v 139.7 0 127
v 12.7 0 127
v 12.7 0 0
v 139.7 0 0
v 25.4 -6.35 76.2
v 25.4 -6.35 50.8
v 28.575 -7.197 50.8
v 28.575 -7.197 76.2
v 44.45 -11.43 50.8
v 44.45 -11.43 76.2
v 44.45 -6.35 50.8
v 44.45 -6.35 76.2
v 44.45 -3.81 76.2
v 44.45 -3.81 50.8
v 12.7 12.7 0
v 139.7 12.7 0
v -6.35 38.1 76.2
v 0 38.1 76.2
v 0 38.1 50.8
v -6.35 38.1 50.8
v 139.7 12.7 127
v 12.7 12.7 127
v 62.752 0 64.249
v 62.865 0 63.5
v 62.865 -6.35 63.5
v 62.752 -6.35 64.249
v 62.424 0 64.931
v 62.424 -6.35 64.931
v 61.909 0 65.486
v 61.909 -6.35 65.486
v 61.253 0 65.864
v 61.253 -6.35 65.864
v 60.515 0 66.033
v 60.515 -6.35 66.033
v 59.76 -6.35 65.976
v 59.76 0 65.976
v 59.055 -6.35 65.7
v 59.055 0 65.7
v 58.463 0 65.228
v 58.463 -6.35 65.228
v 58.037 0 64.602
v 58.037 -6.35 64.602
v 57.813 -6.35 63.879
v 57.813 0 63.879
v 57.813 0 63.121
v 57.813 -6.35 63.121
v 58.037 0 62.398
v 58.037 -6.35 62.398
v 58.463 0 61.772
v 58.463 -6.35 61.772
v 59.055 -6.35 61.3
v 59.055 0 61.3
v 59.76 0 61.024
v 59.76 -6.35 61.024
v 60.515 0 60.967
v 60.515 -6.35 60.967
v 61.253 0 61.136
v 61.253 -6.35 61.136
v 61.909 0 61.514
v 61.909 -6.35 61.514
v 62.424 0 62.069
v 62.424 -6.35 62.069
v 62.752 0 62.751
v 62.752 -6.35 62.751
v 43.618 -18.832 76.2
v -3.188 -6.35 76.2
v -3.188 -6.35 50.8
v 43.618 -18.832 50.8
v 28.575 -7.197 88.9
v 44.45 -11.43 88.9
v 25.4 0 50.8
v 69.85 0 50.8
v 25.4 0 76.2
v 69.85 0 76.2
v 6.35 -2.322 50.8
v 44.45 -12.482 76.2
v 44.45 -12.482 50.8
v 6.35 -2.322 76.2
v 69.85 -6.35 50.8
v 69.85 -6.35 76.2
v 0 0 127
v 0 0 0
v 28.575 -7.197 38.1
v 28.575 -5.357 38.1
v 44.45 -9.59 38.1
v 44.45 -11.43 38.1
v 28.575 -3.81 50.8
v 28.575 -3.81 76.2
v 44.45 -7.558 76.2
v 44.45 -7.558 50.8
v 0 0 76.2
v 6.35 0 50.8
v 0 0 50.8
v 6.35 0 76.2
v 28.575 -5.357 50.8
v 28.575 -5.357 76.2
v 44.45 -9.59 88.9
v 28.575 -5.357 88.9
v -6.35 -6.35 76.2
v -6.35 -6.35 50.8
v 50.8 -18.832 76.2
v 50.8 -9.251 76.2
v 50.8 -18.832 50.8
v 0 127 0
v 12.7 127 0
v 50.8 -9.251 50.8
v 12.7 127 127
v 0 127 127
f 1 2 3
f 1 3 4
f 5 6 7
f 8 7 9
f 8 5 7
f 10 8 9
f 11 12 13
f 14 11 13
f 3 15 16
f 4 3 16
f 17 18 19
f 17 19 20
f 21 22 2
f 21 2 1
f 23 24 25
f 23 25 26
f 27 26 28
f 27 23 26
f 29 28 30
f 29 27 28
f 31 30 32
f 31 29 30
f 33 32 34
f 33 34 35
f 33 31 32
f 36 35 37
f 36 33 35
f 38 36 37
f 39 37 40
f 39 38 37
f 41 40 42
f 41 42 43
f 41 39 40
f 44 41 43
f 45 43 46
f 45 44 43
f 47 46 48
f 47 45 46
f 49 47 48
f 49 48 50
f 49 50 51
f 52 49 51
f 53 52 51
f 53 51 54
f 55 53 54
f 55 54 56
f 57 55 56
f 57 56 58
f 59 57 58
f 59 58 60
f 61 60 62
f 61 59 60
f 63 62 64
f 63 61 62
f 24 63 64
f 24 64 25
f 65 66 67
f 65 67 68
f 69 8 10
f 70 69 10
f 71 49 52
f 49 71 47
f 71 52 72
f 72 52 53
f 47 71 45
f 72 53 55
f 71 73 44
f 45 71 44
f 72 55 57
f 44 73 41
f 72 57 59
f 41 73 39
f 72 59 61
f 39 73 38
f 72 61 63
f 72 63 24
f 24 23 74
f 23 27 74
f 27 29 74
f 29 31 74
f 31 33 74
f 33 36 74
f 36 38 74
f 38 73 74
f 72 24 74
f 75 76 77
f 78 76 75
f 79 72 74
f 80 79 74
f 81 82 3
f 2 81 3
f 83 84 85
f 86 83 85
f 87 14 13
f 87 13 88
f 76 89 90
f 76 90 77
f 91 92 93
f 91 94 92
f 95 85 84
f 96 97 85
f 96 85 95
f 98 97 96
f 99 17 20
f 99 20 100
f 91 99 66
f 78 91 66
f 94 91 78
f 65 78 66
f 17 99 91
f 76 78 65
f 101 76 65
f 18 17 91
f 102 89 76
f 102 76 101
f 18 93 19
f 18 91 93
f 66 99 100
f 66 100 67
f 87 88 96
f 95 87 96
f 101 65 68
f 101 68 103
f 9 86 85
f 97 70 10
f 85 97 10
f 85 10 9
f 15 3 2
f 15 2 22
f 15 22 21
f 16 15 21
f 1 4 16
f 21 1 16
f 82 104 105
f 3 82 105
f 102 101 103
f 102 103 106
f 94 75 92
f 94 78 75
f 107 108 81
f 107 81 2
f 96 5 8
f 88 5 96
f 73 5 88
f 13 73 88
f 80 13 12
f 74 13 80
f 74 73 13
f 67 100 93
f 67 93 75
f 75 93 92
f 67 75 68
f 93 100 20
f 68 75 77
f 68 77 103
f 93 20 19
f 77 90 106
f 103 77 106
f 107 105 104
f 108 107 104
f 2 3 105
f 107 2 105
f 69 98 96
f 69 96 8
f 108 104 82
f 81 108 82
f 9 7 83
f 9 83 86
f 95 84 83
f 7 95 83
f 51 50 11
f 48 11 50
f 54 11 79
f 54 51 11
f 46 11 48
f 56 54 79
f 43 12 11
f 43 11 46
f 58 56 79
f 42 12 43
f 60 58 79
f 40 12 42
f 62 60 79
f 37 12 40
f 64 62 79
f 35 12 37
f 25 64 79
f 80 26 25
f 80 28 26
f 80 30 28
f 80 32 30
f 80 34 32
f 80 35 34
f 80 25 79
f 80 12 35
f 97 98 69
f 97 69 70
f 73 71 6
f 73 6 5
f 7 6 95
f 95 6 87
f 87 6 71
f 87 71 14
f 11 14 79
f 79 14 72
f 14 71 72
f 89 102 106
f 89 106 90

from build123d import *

# Parameters (mm, degrees)
F1_DEPTH  = 127
F0_W      = 127
F0_H      = 12.7
F2_DEPTH  = 127
F3_W      = 44.45
F3_H      = 25.4
F3_R      = 2.54
F4_DEPTH  = 6.35
F6_DEPTH  = 25.4
F8_DEPTH  = 76.201
F10_DEPTH = 12.7
F15_DEPTH = 12.7


with BuildPart() as f1:
    # F0 (on Top) → F1 (new body)
    with BuildSketch(Plane.XY):
        Polygon((12.7, 127), (0, 127), (0, 0), (12.7, 0), (12.7, 12.7), align=None)
    extrude(amount=F1_DEPTH)


with BuildPart() as f2:
    # F0 (on Top) → F2 (new body)
    with BuildSketch(Plane.XY):
        with Locations((76.2, 6.35)):
            Rectangle(F0_W, F0_H)
    extrude(amount=F2_DEPTH)


with BuildPart() as f4:
    # F3 (on face) → F4 (new body)
    with BuildSketch(Plane.XZ):
        with Locations((47.625, 63.5)):
            Rectangle(F3_W, F3_H)
        with Locations((60.325, 63.5)):
            Circle(F3_R, mode=Mode.SUBTRACT)
    extrude(amount=F4_DEPTH)

    # F5 (on face) → F6 (join, through all)
    with BuildSketch(Plane.XY.offset(76.2)):
        Polygon((44.45, -6.35), (25.4, -6.35), (44.45, -11.43), align=None)
    extrude(amount=-F6_DEPTH)

    # F7 (on face) → F8 (cut, through all)
    with BuildSketch(Plane.XY.offset(76.2)):
        Polygon((28.575, -5.3565344927), (44.45, -9.589867826), (44.45, -3.81), (28.575, -3.81), align=None)
    extrude(amount=-F8_DEPTH, mode=Mode.SUBTRACT)

    # F9 (on face) → F10 (join)
    with BuildSketch(Plane.XY.offset(76.2)):
        Polygon((44.45, -11.43), (44.45, -9.589867826), (28.575, -5.3565344927), (28.575, -7.1966666667), align=None)
    extrude(amount=F10_DEPTH)

    # F13: F4 across plane


with BuildPart() as f4_1:
    add(f4.part)
    add(f4.part.mirror(Plane.XY.offset(63.5)))


with BuildPart() as f15:
    # F14 (on plane+point) → F15 (new body, symmetric)
    with BuildSketch(Plane.XY.offset(63.5)):
        Polygon((0, 0), (0, 38.1), (-6.35, 38.1), (-6.35, -6.35), (-3.1877677032, -6.35), (43.6178726697, -18.8315040994), (50.8, -18.8315040994), (50.8, -9.2512011593), (44.45, -7.557867826), (44.45, -12.4815040994), (6.35, -2.3215040994), (6.35, 0), align=None)
    extrude(amount=F15_DEPTH, both=True)


solid = Compound([f1.part, f2.part, f4_1.part, f15.part])
